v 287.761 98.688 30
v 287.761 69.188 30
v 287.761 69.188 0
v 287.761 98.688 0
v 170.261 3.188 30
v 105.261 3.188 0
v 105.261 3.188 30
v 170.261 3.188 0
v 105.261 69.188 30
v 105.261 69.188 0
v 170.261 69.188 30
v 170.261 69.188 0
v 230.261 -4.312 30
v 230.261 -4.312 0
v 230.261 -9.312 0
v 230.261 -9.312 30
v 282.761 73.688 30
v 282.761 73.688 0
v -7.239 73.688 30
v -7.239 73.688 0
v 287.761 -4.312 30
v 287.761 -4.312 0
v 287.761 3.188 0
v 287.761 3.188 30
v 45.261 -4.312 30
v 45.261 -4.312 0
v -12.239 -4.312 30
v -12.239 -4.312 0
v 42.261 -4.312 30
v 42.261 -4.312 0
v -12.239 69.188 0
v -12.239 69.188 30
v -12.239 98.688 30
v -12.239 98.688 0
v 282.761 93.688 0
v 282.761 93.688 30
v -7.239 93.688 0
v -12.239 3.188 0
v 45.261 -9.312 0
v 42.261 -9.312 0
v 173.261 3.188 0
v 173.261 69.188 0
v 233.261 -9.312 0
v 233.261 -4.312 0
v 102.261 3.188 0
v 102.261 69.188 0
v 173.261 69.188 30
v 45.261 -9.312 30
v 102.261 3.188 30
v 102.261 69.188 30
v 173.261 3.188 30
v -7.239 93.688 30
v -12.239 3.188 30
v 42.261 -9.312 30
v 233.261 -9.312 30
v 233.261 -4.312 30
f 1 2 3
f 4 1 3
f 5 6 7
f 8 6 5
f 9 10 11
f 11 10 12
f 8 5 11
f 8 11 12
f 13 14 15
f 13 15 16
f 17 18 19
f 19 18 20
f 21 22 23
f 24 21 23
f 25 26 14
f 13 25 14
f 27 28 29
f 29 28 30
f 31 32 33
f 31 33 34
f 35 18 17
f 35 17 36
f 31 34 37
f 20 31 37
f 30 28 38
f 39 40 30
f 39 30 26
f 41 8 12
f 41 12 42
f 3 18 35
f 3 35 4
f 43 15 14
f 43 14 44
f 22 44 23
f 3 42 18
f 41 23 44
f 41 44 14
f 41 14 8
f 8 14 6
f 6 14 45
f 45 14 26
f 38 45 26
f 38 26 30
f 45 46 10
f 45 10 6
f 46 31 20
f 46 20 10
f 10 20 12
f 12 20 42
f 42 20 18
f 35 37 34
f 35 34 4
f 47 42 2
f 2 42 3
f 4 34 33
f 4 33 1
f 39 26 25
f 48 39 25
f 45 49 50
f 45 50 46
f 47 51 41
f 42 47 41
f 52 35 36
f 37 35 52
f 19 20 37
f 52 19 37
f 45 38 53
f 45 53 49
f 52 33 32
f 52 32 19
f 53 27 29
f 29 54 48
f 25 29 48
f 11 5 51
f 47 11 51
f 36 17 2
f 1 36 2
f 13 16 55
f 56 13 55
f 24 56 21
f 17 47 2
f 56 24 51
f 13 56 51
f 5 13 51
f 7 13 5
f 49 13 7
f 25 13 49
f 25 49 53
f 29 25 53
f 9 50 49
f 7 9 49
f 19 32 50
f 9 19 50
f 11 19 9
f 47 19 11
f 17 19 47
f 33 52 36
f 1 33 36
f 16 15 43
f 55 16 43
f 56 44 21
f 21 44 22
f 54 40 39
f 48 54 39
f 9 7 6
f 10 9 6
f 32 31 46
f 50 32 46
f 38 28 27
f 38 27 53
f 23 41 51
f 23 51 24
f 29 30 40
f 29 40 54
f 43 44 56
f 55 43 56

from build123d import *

# Parameters (mm, degrees)
SKETCH2_W           = 300
SKETCH2_H           = 7.5
BOSS_EXTRUDE1_DEPTH = 30
SKETCH3_W           = 3
SKETCH3_H           = 30
BOSS_EXTRUDE2_DEPTH = 5
SKETCH4_W           = 3
SKETCH4_H           = 30
BOSS_EXTRUDE3_DEPTH = 66
SKETCH5_W           = 300
SKETCH5_H           = 30
BOSS_EXTRUDE4_DEPTH = 29.5
SKETCH6_W           = 290
SKETCH6_H           = 20
CUT_EXTRUDE1_DEPTH  = 306.68909869


with BuildPart() as part:
    # Sketch2 → Boss-Extrude1 (new body)
    with BuildSketch(Plane.XY):
        with Locations((137.761363636, -0.5625)):
            Rectangle(SKETCH2_W, SKETCH2_H)
    extrude(amount=BOSS_EXTRUDE1_DEPTH)

    # Sketch3 → Boss-Extrude2 (add)
    with BuildSketch(Plane.XZ.offset(4.3125)):
        with Locations((231.761363636, 15)):
            Rectangle(SKETCH3_W, SKETCH3_H)
        with Locations((43.761363636, 15)):
            Rectangle(SKETCH3_W, SKETCH3_H)
    extrude(amount=BOSS_EXTRUDE2_DEPTH)

    # Sketch4 → Boss-Extrude3 (add)
    with BuildSketch(Plane(origin=(0, 3.1875, 0), x_dir=(1, 0, 0), z_dir=(0, 1, 0))):
        with Locations((171.761363636, -15)):
            Rectangle(SKETCH4_W, SKETCH4_H)
        with Locations((103.761363636, -15)):
            Rectangle(SKETCH4_W, SKETCH4_H)
    extrude(amount=BOSS_EXTRUDE3_DEPTH)

    # Sketch5 → Boss-Extrude4 (add)
    with BuildSketch(Plane(origin=(0, 69.1875, 0), x_dir=(1, 0, 0), z_dir=(0, 1, 0))):
        with Locations((137.761363636, -15)):
            Rectangle(SKETCH5_W, SKETCH5_H)
    extrude(amount=BOSS_EXTRUDE4_DEPTH)

    # Sketch6 → Cut-Extrude1 (cut, through all)
    with BuildSketch(Plane(origin=(0, 0, 0), x_dir=(-1, 0, 0), z_dir=(0, 0, -1))):
        with Locations((-137.761363636, 83.6875)):
            Rectangle(SKETCH6_W, SKETCH6_H)
    extrude(amount=-CUT_EXTRUDE1_DEPTH, mode=Mode.SUBTRACT)


solid = part.part
